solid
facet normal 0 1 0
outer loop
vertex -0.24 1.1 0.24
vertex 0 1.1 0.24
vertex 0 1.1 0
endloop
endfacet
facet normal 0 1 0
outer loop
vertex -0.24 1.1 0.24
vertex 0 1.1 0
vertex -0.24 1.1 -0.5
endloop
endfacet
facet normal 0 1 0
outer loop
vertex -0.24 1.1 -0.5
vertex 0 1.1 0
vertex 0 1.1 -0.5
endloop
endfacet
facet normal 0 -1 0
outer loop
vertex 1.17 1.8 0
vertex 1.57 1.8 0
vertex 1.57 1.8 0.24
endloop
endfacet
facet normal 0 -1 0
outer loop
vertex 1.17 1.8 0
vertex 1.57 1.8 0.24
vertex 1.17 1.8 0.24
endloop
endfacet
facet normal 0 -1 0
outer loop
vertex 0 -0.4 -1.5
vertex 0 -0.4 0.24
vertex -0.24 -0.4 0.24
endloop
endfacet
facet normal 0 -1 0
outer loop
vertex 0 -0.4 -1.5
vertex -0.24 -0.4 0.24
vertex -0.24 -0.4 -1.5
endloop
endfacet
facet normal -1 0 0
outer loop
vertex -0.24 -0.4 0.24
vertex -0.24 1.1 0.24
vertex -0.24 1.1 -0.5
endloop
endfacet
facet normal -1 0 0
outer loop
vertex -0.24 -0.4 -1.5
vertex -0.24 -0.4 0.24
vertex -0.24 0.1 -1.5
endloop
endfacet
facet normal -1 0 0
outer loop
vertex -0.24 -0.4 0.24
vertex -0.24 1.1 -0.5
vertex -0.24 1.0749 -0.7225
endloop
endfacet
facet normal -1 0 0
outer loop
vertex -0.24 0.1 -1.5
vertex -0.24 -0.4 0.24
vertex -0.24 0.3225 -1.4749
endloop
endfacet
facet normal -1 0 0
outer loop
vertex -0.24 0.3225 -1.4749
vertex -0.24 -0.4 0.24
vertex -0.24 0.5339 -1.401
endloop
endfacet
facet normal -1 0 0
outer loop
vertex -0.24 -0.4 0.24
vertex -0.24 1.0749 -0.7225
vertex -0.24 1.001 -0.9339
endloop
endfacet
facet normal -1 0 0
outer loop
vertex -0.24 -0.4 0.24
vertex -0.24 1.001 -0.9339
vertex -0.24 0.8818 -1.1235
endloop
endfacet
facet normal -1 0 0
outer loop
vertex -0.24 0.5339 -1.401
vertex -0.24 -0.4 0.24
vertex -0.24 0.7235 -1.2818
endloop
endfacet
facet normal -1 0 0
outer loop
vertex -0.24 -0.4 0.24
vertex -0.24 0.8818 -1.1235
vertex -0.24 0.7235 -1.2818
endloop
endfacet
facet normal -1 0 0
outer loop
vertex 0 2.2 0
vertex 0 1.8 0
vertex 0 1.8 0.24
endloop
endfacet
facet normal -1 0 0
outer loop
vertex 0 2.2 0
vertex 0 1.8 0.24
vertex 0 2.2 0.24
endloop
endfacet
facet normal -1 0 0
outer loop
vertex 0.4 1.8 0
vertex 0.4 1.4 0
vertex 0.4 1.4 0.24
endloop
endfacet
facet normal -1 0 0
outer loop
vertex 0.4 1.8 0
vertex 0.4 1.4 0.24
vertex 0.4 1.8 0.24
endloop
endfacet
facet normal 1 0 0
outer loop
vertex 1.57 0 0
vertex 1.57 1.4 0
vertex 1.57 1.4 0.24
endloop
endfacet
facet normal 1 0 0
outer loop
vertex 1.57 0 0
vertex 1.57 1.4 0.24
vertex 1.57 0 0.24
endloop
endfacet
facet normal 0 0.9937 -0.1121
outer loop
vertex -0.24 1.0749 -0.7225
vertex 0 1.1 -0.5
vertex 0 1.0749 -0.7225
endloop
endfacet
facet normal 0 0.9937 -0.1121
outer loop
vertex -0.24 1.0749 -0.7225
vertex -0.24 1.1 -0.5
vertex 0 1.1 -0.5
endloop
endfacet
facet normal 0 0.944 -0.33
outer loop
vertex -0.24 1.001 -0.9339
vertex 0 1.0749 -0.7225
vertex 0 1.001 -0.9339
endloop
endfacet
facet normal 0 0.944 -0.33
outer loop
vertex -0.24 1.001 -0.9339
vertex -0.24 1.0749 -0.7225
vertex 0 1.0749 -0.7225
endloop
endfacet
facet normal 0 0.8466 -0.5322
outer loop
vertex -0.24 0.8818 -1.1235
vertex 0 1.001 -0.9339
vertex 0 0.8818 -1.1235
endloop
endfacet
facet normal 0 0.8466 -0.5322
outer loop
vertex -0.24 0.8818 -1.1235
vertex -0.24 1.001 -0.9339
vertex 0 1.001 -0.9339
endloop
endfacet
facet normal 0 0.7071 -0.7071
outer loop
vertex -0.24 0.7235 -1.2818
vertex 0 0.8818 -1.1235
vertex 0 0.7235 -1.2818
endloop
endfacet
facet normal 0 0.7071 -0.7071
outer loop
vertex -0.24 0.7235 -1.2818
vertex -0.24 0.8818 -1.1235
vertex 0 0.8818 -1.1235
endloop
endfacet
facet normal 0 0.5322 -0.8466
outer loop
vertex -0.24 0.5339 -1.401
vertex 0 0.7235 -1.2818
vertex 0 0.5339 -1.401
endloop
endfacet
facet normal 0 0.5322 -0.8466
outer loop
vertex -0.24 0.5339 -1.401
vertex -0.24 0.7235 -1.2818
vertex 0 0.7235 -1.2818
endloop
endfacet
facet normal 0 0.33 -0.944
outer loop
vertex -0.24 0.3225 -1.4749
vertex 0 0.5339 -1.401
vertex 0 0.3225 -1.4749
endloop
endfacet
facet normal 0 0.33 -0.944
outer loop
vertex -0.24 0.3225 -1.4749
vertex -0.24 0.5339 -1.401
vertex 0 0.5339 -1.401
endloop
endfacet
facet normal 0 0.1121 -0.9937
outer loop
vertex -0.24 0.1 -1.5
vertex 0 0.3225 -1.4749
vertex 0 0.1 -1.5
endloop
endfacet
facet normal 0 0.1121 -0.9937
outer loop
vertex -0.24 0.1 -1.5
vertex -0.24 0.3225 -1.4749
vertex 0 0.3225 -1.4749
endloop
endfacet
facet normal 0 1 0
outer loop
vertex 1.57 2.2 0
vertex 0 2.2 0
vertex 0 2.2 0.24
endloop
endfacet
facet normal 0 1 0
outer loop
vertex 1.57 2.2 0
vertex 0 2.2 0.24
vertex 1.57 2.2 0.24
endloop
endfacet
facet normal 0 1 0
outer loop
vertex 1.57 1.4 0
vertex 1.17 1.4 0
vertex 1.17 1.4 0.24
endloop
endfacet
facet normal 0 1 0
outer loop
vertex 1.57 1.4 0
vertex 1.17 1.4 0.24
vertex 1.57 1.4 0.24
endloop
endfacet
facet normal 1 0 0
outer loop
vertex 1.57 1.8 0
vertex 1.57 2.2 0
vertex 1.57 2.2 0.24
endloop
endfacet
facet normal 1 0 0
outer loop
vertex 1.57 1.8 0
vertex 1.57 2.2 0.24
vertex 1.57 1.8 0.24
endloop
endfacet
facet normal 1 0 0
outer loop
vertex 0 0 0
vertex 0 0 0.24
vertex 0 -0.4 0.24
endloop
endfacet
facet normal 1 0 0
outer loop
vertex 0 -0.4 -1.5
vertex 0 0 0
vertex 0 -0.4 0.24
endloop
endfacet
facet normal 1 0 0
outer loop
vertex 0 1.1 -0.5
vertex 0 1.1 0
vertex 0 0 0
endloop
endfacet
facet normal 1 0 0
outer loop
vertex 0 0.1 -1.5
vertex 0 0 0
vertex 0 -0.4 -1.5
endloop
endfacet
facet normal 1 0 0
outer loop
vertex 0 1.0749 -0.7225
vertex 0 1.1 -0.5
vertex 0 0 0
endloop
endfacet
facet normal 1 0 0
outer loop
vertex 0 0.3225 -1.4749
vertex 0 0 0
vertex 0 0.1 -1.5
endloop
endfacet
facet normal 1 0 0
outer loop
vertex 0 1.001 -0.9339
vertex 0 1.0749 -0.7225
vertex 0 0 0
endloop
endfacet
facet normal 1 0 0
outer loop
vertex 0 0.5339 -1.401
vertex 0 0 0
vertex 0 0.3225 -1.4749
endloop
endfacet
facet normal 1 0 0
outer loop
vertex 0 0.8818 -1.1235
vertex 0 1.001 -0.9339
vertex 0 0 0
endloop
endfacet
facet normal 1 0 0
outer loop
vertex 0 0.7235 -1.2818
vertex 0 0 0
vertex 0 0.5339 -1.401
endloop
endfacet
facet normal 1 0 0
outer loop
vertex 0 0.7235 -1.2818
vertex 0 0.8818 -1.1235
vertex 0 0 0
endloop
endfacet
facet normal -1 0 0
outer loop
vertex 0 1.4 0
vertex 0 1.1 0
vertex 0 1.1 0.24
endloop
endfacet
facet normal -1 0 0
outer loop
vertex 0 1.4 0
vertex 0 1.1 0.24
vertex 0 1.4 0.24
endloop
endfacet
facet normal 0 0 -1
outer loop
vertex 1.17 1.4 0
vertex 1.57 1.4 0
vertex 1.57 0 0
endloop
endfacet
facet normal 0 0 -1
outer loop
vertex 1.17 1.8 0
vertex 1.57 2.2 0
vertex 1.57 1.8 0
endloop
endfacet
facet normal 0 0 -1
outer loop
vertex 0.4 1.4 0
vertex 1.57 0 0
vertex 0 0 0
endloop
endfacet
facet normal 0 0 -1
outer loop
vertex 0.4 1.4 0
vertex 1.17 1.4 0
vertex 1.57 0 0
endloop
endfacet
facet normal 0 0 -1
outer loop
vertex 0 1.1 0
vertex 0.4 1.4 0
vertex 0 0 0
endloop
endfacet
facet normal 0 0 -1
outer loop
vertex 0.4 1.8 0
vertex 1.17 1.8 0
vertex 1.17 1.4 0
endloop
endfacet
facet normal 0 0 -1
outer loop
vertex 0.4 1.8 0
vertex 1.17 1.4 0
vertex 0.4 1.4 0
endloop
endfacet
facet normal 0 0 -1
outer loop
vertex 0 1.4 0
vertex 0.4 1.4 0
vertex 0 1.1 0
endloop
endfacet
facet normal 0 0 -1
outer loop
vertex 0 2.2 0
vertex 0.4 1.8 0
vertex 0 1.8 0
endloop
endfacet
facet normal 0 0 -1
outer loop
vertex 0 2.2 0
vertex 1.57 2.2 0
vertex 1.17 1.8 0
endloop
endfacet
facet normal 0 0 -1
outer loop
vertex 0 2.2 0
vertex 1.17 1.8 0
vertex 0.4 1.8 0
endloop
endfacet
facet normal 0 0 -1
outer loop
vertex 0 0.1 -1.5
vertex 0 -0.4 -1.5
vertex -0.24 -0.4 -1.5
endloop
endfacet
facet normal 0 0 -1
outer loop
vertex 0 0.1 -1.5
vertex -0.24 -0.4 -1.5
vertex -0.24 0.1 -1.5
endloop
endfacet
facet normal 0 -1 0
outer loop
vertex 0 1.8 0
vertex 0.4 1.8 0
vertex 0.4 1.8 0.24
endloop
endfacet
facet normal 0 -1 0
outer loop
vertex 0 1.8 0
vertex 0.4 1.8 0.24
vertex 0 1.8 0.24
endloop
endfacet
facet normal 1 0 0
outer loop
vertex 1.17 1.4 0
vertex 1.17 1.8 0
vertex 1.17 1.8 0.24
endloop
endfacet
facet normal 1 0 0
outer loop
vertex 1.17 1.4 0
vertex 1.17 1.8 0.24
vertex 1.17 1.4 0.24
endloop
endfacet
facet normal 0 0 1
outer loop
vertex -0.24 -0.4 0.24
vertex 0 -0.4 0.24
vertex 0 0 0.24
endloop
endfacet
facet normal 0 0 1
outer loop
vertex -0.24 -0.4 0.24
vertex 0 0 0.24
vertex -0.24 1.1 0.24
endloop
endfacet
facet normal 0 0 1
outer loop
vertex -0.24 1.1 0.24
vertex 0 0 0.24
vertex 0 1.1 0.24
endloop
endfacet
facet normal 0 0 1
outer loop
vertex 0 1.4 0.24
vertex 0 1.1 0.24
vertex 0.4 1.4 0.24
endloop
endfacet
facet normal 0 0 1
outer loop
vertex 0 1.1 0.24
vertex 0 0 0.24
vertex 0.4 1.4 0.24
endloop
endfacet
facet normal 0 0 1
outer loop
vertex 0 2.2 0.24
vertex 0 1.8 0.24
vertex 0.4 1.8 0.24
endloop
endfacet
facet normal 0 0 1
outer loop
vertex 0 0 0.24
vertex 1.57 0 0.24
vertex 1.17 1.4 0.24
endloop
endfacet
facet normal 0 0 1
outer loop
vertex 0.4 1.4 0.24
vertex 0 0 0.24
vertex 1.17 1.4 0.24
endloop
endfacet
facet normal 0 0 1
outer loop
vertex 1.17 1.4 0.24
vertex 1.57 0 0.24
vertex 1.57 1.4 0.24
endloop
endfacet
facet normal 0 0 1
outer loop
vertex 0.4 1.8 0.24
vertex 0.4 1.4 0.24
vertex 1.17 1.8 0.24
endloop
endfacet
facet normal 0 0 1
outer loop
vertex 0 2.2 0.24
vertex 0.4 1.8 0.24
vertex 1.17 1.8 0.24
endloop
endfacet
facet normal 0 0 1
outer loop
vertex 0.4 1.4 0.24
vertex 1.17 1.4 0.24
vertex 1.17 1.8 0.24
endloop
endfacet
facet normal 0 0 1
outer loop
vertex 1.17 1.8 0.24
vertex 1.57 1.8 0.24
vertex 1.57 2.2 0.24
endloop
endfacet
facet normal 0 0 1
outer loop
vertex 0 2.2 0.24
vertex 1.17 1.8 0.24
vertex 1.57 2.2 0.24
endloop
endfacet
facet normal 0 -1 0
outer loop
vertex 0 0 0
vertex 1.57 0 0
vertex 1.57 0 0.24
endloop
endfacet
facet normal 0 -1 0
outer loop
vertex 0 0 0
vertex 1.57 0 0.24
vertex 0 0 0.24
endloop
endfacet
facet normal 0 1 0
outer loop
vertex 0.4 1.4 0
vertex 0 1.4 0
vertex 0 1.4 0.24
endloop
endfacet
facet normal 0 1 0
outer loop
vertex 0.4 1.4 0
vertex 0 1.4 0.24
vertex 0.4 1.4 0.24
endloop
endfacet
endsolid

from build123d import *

# Parameters (mm, degrees)
BOSS_EXTRUDE1_DEPTH = 0.24
BOSS_EXTRUDE2_DEPTH = 0.24
FILLET1_R           = 1


with BuildPart() as part:
    # Sketch1 → Boss-Extrude1 (new body)
    with BuildSketch(Plane.XY):
        Polygon((0, 0), (0, 1.4), (0.4, 1.4), (0.4, 1.8), (0, 1.8), (0, 2.2), (1.57, 2.2), (1.57, 1.8), (1.17, 1.8), (1.17, 1.4), (1.57, 1.4), (1.57, 0), align=None)
    extrude(amount=BOSS_EXTRUDE1_DEPTH)

    # Sketch2 → Boss-Extrude2 (add)
    with BuildSketch(Plane.ZY):
        Polygon((0.24, 0), (0.24, -0.4), (-1.5, -0.4), (-1.5, 1.1), (0, 1.1), (0.24, 1.1), align=None)
    extrude(amount=BOSS_EXTRUDE2_DEPTH)

    # Fillet1
    fillet1_edges = [part.edges().sort_by_distance(p)[0] for p in [
        (-0.12, 1.1, -1.5),
    ]]
    fillet(fillet1_edges, radius=FILLET1_R)


solid = part.part
